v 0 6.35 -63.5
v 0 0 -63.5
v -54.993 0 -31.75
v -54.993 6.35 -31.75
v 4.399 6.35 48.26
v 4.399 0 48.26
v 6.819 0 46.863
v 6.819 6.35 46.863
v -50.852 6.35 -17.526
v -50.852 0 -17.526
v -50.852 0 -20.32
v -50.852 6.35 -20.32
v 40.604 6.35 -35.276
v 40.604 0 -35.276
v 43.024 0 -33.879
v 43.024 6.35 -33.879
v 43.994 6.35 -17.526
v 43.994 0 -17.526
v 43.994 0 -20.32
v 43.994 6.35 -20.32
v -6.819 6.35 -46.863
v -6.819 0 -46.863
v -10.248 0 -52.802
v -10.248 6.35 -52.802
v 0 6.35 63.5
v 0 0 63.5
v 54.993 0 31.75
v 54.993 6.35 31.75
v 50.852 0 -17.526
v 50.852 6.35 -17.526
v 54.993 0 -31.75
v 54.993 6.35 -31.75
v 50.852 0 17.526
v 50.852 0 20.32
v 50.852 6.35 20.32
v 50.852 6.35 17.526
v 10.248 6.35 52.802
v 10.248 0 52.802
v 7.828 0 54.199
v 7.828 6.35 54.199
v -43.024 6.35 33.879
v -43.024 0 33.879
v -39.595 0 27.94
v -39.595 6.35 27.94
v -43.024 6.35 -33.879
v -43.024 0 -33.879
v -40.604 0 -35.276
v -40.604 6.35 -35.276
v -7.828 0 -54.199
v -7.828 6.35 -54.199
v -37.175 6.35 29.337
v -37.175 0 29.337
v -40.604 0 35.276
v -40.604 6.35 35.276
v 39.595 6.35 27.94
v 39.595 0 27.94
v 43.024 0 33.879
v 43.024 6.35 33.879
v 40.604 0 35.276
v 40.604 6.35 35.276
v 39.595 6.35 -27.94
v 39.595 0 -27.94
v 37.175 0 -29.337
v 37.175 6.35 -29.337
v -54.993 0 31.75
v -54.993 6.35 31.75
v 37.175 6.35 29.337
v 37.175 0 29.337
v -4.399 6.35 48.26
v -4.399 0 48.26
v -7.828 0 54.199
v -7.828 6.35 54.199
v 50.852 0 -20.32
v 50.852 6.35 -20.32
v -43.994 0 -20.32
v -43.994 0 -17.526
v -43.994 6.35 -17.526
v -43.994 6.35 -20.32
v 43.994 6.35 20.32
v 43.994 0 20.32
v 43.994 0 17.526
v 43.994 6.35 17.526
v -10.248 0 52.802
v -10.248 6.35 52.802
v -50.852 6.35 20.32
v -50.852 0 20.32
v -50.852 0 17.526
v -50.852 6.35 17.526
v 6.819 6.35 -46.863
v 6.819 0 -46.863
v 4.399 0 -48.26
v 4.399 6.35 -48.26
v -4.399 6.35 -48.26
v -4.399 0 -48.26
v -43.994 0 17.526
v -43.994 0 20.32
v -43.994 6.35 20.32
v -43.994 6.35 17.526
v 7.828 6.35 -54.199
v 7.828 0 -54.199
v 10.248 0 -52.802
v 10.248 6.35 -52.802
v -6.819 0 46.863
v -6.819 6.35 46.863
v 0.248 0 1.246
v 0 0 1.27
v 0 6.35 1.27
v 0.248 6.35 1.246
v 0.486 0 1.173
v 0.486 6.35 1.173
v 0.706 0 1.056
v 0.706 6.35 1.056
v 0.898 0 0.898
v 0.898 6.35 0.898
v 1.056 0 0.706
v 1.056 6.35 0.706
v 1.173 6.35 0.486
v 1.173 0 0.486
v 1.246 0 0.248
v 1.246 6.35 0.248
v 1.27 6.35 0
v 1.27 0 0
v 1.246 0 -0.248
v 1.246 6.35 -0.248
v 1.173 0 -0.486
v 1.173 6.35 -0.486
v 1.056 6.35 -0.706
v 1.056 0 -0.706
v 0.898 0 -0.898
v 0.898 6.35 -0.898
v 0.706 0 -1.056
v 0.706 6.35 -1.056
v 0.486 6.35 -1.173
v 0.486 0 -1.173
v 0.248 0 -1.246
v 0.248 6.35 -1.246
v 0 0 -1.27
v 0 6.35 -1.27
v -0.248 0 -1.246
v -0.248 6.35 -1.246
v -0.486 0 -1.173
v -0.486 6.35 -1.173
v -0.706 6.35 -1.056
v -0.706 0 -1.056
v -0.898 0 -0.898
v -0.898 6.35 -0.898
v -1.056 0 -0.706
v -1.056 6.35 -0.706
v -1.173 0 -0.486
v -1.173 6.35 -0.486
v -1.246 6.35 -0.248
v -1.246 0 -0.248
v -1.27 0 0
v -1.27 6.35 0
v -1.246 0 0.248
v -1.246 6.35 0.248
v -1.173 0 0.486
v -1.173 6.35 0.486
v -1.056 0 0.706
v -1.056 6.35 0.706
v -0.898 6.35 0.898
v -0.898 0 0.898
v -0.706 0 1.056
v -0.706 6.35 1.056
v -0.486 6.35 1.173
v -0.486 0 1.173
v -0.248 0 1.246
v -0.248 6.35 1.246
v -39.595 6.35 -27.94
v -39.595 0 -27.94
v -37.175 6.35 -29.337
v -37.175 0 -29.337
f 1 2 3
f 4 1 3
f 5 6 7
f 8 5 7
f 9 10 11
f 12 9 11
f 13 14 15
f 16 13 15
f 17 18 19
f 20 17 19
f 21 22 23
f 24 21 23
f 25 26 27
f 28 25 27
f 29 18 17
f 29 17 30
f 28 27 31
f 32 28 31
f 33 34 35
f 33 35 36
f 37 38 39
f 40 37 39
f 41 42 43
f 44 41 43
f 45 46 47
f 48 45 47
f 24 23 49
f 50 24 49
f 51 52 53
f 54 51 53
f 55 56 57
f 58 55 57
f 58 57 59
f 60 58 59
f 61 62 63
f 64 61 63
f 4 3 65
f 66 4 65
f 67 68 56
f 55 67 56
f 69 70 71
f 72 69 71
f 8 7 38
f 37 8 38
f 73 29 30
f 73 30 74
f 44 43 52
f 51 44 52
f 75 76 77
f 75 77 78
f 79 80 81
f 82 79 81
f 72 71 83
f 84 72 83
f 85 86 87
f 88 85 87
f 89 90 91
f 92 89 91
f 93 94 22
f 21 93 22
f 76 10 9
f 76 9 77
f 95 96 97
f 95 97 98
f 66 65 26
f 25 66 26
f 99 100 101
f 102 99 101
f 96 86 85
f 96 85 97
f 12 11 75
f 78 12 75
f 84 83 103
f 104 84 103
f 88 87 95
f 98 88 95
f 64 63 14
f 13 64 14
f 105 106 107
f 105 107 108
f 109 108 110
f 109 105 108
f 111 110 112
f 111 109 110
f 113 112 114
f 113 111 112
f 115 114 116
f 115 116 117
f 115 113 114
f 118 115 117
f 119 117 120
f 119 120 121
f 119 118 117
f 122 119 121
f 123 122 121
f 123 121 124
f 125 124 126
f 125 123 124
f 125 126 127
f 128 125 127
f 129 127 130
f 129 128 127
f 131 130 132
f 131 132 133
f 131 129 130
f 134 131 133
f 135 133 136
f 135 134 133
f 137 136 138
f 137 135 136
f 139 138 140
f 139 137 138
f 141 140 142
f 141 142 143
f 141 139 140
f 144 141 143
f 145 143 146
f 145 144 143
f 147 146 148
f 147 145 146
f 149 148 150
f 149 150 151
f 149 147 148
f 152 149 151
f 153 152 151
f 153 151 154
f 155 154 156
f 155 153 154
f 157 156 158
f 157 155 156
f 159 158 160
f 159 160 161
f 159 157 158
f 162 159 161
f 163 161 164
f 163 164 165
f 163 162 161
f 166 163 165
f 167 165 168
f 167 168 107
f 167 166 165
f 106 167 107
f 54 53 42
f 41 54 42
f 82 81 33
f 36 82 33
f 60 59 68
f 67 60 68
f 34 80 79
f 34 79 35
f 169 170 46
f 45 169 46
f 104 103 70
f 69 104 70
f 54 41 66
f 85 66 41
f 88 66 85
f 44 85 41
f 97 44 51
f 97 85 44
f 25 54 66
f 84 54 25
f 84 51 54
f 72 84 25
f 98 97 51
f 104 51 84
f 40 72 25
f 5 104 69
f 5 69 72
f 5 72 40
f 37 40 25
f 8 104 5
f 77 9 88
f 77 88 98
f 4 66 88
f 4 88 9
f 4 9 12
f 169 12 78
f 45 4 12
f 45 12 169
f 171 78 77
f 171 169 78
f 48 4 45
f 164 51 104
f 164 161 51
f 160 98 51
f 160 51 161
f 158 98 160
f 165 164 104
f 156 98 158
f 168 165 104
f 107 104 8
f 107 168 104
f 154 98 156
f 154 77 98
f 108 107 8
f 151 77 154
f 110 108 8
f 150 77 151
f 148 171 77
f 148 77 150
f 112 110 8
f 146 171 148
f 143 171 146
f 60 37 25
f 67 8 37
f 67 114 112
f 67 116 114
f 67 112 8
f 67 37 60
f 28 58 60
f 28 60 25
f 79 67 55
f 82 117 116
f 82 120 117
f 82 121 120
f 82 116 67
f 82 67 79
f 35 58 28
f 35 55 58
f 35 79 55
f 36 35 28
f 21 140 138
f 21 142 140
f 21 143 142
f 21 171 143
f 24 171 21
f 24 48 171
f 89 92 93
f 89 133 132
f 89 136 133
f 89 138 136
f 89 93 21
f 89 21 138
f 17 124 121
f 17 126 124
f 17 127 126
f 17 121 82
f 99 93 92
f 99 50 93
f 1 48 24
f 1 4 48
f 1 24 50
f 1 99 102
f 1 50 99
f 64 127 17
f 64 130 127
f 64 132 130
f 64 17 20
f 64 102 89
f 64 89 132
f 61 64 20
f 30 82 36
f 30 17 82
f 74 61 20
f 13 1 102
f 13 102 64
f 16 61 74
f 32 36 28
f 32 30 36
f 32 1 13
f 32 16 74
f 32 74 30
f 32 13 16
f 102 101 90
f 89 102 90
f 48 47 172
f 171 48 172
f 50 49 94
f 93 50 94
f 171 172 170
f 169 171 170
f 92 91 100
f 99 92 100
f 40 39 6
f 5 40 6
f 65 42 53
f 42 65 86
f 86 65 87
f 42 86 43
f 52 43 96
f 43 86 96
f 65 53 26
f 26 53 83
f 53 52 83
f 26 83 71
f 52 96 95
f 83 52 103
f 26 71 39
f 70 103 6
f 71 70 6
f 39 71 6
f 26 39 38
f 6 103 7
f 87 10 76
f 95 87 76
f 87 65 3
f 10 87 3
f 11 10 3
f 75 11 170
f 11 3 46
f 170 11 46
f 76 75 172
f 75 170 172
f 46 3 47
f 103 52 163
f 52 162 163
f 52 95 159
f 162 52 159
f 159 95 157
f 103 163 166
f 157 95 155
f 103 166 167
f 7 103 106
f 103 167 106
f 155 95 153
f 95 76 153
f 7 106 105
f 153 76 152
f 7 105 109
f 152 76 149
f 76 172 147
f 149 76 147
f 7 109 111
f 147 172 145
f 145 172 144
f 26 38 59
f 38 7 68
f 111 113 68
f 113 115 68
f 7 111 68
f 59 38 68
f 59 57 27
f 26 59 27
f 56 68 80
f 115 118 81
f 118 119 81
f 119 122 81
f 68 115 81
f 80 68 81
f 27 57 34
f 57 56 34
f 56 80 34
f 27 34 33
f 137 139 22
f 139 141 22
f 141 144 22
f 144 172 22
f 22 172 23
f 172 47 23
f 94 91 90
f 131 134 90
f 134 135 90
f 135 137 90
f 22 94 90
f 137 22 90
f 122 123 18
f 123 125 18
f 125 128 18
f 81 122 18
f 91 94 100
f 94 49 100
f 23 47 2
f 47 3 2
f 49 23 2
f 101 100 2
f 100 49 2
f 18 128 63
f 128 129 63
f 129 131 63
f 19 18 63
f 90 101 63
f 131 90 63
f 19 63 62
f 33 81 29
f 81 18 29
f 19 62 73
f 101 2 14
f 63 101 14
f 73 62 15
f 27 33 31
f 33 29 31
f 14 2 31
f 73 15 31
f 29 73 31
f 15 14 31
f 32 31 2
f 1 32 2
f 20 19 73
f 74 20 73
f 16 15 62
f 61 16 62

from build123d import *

# Parameters (mm, degrees)
SKETCH1_W           = 6.858
SKETCH1_H           = 2.794
SKETCH1_R           = 1.27
BOSS_EXTRUDE1_DEPTH = 6.35


with BuildPart() as part:
    # Sketch1 → Boss-Extrude1 (new body)
    with BuildSketch(Plane(origin=(0, 0, 0), x_dir=(1, 0, 0), z_dir=(0, 1, 0))):
        Polygon((54.99261314, -31.75), (54.99261314, 31.75), (0, 63.5), (-54.99261314, 31.75), (-54.99261314, -31.75), (0, -63.5), align=None)
        with Locations((47.423090512, 18.923)):
            Rectangle(SKETCH1_W, SKETCH1_H, mode=Mode.SUBTRACT)
        with Locations((47.423090512, -18.923)):
            Rectangle(SKETCH1_W, SKETCH1_H, mode=Mode.SUBTRACT)
        Polygon((37.175006483, -29.337), (39.594681461, -27.94), (43.023681461, -33.879202219), (40.604006483, -35.276202219), align=None, mode=Mode.SUBTRACT)
        Polygon((4.399409051, -48.26), (6.819084029, -46.863), (10.248084029, -52.802202219), (7.828409051, -54.199202219), align=None, mode=Mode.SUBTRACT)
        Polygon((-6.819084029, -46.863), (-4.399409051, -48.26), (-7.828409051, -54.199202219), (-10.248084029, -52.802202219), align=None, mode=Mode.SUBTRACT)
        Polygon((-39.594681461, -27.94), (-37.175006483, -29.337), (-40.604006483, -35.276202219), (-43.023681461, -33.879202219), align=None, mode=Mode.SUBTRACT)
        with Locations((-47.423090512, -18.923)):
            Rectangle(SKETCH1_W, SKETCH1_H, mode=Mode.SUBTRACT)
        with Locations((-47.423090512, 18.923)):
            Rectangle(SKETCH1_W, SKETCH1_H, mode=Mode.SUBTRACT)
        Polygon((-37.175006483, 29.337), (-39.594681461, 27.94), (-43.023681461, 33.879202219), (-40.604006483, 35.276202219), align=None, mode=Mode.SUBTRACT)
        Polygon((-4.399409051, 48.26), (-6.819084029, 46.863), (-10.248084029, 52.802202219), (-7.828409051, 54.199202219), align=None, mode=Mode.SUBTRACT)
        Polygon((6.819084029, 46.863), (4.399409051, 48.26), (7.828409051, 54.199202219), (10.248084029, 52.802202219), align=None, mode=Mode.SUBTRACT)
        Polygon((39.594681461, 27.94), (37.175006483, 29.337), (40.604006483, 35.276202219), (43.023681461, 33.879202219), align=None, mode=Mode.SUBTRACT)
        with Locations(Location((0, 0, 0), (0, 0, 270))):
            Circle(SKETCH1_R, mode=Mode.SUBTRACT)
    extrude(amount=BOSS_EXTRUDE1_DEPTH)


solid = part.part
